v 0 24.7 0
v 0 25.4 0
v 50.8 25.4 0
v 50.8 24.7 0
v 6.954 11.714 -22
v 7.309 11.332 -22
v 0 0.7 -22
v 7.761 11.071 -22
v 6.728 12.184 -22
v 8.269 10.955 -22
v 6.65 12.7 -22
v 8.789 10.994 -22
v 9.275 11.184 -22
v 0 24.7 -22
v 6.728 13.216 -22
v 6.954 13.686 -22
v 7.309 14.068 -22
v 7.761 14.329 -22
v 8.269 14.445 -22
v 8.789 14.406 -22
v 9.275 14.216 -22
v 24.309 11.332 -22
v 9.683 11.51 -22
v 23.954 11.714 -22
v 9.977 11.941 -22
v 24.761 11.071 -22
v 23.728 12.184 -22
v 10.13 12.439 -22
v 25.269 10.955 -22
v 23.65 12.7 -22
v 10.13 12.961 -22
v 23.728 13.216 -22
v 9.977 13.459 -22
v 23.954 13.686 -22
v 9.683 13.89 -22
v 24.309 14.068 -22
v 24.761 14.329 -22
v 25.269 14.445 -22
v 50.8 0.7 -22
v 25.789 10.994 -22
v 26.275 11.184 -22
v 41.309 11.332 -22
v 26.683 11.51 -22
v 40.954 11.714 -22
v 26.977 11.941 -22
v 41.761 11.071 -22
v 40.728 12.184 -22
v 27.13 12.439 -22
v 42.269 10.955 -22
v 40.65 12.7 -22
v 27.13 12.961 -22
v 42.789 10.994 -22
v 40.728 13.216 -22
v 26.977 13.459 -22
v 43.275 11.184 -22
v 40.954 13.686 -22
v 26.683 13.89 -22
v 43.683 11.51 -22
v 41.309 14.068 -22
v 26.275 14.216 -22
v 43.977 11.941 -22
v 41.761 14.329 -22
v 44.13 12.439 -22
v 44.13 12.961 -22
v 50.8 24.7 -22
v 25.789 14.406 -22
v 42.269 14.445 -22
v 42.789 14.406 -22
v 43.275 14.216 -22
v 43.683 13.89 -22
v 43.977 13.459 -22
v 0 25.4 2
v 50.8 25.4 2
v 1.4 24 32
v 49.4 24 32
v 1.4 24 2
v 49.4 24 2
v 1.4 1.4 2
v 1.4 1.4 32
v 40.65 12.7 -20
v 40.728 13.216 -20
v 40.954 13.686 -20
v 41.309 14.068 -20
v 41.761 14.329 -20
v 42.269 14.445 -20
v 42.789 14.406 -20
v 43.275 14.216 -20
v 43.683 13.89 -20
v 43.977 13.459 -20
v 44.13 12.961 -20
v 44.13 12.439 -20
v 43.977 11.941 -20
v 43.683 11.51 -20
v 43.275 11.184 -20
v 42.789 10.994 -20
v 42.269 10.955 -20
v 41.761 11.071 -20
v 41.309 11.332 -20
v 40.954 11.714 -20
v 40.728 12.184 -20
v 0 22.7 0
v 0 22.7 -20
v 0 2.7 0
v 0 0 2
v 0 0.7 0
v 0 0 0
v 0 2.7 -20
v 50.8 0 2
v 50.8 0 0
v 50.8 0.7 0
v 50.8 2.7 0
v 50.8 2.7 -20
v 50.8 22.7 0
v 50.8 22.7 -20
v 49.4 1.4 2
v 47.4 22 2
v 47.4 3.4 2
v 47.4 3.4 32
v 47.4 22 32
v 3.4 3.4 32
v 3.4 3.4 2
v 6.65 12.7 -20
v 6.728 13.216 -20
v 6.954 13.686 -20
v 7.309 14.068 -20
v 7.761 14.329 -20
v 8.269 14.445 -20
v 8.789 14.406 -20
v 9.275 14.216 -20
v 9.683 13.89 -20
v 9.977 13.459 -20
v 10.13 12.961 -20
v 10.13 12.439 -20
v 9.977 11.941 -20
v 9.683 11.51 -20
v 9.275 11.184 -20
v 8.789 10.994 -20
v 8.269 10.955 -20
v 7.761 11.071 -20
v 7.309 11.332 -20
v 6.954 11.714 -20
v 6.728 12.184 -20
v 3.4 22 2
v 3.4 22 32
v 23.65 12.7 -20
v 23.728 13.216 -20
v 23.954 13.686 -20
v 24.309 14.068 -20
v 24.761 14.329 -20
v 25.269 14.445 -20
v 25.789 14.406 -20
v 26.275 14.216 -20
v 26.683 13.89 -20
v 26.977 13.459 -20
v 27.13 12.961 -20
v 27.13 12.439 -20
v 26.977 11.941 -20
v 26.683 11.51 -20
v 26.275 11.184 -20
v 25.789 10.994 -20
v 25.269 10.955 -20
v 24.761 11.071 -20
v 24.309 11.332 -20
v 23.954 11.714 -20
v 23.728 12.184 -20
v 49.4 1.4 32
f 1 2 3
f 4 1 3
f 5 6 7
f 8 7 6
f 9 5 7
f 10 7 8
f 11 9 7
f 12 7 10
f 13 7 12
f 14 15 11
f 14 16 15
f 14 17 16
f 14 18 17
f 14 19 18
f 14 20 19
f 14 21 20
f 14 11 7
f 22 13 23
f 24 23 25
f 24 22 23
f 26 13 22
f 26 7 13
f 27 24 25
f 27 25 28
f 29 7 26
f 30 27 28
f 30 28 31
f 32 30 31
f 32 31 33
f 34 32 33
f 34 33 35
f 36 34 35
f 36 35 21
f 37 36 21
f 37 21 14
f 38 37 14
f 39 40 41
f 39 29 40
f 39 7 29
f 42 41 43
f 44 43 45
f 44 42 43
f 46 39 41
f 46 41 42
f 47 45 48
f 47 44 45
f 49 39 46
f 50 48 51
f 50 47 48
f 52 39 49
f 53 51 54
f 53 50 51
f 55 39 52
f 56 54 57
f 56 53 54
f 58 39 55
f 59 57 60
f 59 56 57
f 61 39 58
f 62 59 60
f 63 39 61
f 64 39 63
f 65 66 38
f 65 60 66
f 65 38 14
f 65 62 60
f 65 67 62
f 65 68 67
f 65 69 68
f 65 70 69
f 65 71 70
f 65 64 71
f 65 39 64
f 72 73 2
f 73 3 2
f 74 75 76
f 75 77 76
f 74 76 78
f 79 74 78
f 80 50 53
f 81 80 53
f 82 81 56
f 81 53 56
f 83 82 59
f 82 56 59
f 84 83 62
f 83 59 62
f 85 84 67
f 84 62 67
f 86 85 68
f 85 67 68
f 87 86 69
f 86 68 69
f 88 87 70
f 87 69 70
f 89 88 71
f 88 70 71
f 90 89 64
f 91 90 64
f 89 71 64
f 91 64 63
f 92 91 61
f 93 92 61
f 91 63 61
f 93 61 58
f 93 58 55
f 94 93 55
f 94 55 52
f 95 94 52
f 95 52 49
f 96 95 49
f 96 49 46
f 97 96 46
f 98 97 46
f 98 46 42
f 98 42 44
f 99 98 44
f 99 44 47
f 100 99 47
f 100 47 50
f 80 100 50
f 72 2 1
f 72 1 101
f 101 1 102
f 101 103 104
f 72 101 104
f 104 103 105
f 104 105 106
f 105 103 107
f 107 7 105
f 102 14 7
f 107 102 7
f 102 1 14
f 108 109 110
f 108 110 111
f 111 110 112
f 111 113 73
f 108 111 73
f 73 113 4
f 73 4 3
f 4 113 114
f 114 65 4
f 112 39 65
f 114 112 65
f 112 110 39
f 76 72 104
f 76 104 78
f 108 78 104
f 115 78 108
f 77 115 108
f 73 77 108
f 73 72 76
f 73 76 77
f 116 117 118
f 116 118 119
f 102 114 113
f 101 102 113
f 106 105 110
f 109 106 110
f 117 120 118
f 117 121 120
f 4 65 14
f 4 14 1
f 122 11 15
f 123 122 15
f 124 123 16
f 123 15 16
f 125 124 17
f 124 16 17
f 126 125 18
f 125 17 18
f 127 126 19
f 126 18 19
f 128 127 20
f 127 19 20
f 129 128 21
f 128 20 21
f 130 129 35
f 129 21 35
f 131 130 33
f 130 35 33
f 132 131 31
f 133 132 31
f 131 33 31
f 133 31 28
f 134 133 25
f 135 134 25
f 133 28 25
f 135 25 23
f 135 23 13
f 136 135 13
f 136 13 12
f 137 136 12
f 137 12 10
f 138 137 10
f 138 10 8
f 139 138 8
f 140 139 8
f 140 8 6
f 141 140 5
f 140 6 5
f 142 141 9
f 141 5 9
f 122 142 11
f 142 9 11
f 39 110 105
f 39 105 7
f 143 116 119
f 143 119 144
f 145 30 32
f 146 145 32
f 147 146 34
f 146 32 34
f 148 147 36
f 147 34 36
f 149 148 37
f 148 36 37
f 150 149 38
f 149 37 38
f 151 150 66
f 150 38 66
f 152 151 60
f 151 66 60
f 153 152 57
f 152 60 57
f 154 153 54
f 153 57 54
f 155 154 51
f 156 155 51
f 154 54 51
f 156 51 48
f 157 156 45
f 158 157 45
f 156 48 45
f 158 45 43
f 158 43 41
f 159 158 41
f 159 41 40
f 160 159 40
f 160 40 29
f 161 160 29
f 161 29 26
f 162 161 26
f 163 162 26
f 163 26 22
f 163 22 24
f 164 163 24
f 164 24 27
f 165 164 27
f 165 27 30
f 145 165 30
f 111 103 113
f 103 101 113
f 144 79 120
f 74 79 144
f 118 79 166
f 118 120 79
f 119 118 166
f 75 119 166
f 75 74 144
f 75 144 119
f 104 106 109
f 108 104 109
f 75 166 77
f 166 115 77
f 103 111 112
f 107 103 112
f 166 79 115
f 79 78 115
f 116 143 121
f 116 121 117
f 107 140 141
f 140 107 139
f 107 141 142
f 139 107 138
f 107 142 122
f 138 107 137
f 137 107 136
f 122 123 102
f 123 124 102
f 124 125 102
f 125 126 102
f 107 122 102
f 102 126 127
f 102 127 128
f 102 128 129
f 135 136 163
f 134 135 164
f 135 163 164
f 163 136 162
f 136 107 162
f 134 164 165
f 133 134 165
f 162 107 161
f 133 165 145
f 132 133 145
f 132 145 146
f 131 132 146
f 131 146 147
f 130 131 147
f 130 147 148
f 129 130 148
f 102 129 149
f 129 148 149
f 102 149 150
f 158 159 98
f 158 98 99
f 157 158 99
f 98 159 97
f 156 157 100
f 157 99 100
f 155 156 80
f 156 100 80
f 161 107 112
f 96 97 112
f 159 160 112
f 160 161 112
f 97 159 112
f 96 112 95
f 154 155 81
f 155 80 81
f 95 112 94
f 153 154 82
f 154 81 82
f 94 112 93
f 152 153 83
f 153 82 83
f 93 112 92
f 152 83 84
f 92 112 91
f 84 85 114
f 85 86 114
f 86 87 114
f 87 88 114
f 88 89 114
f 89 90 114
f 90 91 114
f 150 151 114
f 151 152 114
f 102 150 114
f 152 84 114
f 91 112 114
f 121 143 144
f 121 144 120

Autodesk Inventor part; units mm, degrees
ref_plane "YZ Plane" through (0, 0, 0) normal (1, 0, 0) x (0, 1, 0)
ref_plane "XZ Plane" through (0, 0, 0) normal (0, 1, 0) x (-1, 0, 0)
ref_plane "XY Plane" through (0, 0, 0) normal (0, 0, 1) x (1, 0, 0)
sketch "Boceto1" plane through (0, 0, 0) normal (0, 0, 1) x (1, 0, 0)
  line L0 (0, 0) -> (50.8, 0)
  line L1 (50.8, 0) -> (50.8, 25.4)
  line L2 (50.8, 25.4) -> (0, 25.4)
  line L3 (0, 25.4) -> (0, 0)
  dimension "d0" = 50.8
  dimension "d1" = 25.4
extrude "Extrusión1" add sketch "Boceto1" along normal blind 2
sketch "Boceto2" plane through (0, 0, 2) normal (0, 0, 1) x (1, 0, 0)
  line L0 (1.4, 1.4) -> (49.4, 1.4)
  line L1 (49.4, 1.4) -> (49.4, 24)
  line L2 (49.4, 24) -> (1.4, 24)
  line L3 (1.4, 24) -> (1.4, 1.4)
  line L4 (0, 25.4) -> (0, 0) projected
  line L5 (0, 0) -> (50.8, 0) projected
  line L6 (50.8, 25.4) -> (0, 25.4) projected
  line L7 (50.8, 0) -> (50.8, 25.4) projected
  line L8 (3.4, 3.4) -> (47.4, 3.4)
  line L9 (47.4, 3.4) -> (47.4, 22)
  line L10 (47.4, 22) -> (3.4, 22)
  line L11 (3.4, 22) -> (3.4, 3.4)
  dimension "d4" = 1.4
  dimension "d5" = 1.4
  dimension "d6" = 1.4
  dimension "d7" = 1.4
  dimension "d8" = 2
  dimension "d9" = 2
  dimension "d10" = 2
  dimension "d11" = 2
extrude "Extrusión2" add sketch "Boceto2" along normal blind 30 contours L3 L2 L1 L0
sketch "Boceto3" plane through (50.8, 0, 0) normal (1, 0, 0) x (0, 0, -1)
  line L0 (0, 0) -> (0, 25.4) projected
  line L1 (0, 0.7) -> (22, 0.7)
  line L2 (22, 0.7) -> (22, 24.7)
  line L3 (22, 24.7) -> (0, 24.7)
  line L4 (0, 24.7) -> (0, 0.7)
  line L5 (0, 25.4) -> (-2, 25.4) projected
  line L6 (0, 0) -> (-2, 0) projected
  line L7 (0, 2.7) -> (20, 2.7)
  line L8 (20, 2.7) -> (20, 22.7)
  line L9 (20, 22.7) -> (0, 22.7)
  line L10 (0, 22.7) -> (0, 2.7)
  point P0 (-1, 25.4)
  point P1 (0, 24.7)
  point P2 (0, 22.7)
  point P3 (0, 2.7)
  point P4 (0, 0.7)
  dimension "d16" = 24
  dimension "d17" = 25.4
  dimension "d18" = 0.7
  dimension "d19" = 0.7
  dimension "d20" = 22
  dimension "d21" = 0
  dimension "d22" = 2
  dimension "d23" = 2
  dimension "d24" = 2
  dimension "d25" = 20
  dimension "d26" = 20
extrude "Extrusión3" add sketch "Boceto3" against normal up to surface (50.8 mm away) contours L0 L7 L8 L9 L3 L2 L1
sketch "Boceto4" plane through (50.8, 0.7, -22) normal (0, 0, -1) x (-1, 0, 0)
  circle A0 centre (8.4, 12) radius 1.75
  circle A1 centre (25.4, 12) radius 1.75
  circle A2 centre (42.4, 12) radius 1.75
  line L0 (50.8, 0) -> (50.8, 24) projected
  line L1 (0, 0) -> (0, 24) projected
  line L2 (0, 0) -> (50.8, 0) projected
  line L3 (0, 24) -> (50.8, 24) projected
  point P0 (50.8, -0.7)
  dimension "d29" = 3.5
  dimension "d30" = 3.5
  dimension "d31" = 3.5
  dimension "d32" = 17
  dimension "d33" = 17
  dimension "d34" = 50.8
  dimension "d39" = 24
  dimension "d40" = 12
  dimension "d41" = 12
  dimension "d42" = 12
  dimension "d43" = 12
  dimension "d44" = 12
  dimension "d45" = 25.4
  dimension "d46" = 8.4
extrude "Extrusión4" cut sketch "Boceto4" against normal up to surface (2 mm away) contours A0 | A1 | A2
properties part number "Tapa 51mm"
